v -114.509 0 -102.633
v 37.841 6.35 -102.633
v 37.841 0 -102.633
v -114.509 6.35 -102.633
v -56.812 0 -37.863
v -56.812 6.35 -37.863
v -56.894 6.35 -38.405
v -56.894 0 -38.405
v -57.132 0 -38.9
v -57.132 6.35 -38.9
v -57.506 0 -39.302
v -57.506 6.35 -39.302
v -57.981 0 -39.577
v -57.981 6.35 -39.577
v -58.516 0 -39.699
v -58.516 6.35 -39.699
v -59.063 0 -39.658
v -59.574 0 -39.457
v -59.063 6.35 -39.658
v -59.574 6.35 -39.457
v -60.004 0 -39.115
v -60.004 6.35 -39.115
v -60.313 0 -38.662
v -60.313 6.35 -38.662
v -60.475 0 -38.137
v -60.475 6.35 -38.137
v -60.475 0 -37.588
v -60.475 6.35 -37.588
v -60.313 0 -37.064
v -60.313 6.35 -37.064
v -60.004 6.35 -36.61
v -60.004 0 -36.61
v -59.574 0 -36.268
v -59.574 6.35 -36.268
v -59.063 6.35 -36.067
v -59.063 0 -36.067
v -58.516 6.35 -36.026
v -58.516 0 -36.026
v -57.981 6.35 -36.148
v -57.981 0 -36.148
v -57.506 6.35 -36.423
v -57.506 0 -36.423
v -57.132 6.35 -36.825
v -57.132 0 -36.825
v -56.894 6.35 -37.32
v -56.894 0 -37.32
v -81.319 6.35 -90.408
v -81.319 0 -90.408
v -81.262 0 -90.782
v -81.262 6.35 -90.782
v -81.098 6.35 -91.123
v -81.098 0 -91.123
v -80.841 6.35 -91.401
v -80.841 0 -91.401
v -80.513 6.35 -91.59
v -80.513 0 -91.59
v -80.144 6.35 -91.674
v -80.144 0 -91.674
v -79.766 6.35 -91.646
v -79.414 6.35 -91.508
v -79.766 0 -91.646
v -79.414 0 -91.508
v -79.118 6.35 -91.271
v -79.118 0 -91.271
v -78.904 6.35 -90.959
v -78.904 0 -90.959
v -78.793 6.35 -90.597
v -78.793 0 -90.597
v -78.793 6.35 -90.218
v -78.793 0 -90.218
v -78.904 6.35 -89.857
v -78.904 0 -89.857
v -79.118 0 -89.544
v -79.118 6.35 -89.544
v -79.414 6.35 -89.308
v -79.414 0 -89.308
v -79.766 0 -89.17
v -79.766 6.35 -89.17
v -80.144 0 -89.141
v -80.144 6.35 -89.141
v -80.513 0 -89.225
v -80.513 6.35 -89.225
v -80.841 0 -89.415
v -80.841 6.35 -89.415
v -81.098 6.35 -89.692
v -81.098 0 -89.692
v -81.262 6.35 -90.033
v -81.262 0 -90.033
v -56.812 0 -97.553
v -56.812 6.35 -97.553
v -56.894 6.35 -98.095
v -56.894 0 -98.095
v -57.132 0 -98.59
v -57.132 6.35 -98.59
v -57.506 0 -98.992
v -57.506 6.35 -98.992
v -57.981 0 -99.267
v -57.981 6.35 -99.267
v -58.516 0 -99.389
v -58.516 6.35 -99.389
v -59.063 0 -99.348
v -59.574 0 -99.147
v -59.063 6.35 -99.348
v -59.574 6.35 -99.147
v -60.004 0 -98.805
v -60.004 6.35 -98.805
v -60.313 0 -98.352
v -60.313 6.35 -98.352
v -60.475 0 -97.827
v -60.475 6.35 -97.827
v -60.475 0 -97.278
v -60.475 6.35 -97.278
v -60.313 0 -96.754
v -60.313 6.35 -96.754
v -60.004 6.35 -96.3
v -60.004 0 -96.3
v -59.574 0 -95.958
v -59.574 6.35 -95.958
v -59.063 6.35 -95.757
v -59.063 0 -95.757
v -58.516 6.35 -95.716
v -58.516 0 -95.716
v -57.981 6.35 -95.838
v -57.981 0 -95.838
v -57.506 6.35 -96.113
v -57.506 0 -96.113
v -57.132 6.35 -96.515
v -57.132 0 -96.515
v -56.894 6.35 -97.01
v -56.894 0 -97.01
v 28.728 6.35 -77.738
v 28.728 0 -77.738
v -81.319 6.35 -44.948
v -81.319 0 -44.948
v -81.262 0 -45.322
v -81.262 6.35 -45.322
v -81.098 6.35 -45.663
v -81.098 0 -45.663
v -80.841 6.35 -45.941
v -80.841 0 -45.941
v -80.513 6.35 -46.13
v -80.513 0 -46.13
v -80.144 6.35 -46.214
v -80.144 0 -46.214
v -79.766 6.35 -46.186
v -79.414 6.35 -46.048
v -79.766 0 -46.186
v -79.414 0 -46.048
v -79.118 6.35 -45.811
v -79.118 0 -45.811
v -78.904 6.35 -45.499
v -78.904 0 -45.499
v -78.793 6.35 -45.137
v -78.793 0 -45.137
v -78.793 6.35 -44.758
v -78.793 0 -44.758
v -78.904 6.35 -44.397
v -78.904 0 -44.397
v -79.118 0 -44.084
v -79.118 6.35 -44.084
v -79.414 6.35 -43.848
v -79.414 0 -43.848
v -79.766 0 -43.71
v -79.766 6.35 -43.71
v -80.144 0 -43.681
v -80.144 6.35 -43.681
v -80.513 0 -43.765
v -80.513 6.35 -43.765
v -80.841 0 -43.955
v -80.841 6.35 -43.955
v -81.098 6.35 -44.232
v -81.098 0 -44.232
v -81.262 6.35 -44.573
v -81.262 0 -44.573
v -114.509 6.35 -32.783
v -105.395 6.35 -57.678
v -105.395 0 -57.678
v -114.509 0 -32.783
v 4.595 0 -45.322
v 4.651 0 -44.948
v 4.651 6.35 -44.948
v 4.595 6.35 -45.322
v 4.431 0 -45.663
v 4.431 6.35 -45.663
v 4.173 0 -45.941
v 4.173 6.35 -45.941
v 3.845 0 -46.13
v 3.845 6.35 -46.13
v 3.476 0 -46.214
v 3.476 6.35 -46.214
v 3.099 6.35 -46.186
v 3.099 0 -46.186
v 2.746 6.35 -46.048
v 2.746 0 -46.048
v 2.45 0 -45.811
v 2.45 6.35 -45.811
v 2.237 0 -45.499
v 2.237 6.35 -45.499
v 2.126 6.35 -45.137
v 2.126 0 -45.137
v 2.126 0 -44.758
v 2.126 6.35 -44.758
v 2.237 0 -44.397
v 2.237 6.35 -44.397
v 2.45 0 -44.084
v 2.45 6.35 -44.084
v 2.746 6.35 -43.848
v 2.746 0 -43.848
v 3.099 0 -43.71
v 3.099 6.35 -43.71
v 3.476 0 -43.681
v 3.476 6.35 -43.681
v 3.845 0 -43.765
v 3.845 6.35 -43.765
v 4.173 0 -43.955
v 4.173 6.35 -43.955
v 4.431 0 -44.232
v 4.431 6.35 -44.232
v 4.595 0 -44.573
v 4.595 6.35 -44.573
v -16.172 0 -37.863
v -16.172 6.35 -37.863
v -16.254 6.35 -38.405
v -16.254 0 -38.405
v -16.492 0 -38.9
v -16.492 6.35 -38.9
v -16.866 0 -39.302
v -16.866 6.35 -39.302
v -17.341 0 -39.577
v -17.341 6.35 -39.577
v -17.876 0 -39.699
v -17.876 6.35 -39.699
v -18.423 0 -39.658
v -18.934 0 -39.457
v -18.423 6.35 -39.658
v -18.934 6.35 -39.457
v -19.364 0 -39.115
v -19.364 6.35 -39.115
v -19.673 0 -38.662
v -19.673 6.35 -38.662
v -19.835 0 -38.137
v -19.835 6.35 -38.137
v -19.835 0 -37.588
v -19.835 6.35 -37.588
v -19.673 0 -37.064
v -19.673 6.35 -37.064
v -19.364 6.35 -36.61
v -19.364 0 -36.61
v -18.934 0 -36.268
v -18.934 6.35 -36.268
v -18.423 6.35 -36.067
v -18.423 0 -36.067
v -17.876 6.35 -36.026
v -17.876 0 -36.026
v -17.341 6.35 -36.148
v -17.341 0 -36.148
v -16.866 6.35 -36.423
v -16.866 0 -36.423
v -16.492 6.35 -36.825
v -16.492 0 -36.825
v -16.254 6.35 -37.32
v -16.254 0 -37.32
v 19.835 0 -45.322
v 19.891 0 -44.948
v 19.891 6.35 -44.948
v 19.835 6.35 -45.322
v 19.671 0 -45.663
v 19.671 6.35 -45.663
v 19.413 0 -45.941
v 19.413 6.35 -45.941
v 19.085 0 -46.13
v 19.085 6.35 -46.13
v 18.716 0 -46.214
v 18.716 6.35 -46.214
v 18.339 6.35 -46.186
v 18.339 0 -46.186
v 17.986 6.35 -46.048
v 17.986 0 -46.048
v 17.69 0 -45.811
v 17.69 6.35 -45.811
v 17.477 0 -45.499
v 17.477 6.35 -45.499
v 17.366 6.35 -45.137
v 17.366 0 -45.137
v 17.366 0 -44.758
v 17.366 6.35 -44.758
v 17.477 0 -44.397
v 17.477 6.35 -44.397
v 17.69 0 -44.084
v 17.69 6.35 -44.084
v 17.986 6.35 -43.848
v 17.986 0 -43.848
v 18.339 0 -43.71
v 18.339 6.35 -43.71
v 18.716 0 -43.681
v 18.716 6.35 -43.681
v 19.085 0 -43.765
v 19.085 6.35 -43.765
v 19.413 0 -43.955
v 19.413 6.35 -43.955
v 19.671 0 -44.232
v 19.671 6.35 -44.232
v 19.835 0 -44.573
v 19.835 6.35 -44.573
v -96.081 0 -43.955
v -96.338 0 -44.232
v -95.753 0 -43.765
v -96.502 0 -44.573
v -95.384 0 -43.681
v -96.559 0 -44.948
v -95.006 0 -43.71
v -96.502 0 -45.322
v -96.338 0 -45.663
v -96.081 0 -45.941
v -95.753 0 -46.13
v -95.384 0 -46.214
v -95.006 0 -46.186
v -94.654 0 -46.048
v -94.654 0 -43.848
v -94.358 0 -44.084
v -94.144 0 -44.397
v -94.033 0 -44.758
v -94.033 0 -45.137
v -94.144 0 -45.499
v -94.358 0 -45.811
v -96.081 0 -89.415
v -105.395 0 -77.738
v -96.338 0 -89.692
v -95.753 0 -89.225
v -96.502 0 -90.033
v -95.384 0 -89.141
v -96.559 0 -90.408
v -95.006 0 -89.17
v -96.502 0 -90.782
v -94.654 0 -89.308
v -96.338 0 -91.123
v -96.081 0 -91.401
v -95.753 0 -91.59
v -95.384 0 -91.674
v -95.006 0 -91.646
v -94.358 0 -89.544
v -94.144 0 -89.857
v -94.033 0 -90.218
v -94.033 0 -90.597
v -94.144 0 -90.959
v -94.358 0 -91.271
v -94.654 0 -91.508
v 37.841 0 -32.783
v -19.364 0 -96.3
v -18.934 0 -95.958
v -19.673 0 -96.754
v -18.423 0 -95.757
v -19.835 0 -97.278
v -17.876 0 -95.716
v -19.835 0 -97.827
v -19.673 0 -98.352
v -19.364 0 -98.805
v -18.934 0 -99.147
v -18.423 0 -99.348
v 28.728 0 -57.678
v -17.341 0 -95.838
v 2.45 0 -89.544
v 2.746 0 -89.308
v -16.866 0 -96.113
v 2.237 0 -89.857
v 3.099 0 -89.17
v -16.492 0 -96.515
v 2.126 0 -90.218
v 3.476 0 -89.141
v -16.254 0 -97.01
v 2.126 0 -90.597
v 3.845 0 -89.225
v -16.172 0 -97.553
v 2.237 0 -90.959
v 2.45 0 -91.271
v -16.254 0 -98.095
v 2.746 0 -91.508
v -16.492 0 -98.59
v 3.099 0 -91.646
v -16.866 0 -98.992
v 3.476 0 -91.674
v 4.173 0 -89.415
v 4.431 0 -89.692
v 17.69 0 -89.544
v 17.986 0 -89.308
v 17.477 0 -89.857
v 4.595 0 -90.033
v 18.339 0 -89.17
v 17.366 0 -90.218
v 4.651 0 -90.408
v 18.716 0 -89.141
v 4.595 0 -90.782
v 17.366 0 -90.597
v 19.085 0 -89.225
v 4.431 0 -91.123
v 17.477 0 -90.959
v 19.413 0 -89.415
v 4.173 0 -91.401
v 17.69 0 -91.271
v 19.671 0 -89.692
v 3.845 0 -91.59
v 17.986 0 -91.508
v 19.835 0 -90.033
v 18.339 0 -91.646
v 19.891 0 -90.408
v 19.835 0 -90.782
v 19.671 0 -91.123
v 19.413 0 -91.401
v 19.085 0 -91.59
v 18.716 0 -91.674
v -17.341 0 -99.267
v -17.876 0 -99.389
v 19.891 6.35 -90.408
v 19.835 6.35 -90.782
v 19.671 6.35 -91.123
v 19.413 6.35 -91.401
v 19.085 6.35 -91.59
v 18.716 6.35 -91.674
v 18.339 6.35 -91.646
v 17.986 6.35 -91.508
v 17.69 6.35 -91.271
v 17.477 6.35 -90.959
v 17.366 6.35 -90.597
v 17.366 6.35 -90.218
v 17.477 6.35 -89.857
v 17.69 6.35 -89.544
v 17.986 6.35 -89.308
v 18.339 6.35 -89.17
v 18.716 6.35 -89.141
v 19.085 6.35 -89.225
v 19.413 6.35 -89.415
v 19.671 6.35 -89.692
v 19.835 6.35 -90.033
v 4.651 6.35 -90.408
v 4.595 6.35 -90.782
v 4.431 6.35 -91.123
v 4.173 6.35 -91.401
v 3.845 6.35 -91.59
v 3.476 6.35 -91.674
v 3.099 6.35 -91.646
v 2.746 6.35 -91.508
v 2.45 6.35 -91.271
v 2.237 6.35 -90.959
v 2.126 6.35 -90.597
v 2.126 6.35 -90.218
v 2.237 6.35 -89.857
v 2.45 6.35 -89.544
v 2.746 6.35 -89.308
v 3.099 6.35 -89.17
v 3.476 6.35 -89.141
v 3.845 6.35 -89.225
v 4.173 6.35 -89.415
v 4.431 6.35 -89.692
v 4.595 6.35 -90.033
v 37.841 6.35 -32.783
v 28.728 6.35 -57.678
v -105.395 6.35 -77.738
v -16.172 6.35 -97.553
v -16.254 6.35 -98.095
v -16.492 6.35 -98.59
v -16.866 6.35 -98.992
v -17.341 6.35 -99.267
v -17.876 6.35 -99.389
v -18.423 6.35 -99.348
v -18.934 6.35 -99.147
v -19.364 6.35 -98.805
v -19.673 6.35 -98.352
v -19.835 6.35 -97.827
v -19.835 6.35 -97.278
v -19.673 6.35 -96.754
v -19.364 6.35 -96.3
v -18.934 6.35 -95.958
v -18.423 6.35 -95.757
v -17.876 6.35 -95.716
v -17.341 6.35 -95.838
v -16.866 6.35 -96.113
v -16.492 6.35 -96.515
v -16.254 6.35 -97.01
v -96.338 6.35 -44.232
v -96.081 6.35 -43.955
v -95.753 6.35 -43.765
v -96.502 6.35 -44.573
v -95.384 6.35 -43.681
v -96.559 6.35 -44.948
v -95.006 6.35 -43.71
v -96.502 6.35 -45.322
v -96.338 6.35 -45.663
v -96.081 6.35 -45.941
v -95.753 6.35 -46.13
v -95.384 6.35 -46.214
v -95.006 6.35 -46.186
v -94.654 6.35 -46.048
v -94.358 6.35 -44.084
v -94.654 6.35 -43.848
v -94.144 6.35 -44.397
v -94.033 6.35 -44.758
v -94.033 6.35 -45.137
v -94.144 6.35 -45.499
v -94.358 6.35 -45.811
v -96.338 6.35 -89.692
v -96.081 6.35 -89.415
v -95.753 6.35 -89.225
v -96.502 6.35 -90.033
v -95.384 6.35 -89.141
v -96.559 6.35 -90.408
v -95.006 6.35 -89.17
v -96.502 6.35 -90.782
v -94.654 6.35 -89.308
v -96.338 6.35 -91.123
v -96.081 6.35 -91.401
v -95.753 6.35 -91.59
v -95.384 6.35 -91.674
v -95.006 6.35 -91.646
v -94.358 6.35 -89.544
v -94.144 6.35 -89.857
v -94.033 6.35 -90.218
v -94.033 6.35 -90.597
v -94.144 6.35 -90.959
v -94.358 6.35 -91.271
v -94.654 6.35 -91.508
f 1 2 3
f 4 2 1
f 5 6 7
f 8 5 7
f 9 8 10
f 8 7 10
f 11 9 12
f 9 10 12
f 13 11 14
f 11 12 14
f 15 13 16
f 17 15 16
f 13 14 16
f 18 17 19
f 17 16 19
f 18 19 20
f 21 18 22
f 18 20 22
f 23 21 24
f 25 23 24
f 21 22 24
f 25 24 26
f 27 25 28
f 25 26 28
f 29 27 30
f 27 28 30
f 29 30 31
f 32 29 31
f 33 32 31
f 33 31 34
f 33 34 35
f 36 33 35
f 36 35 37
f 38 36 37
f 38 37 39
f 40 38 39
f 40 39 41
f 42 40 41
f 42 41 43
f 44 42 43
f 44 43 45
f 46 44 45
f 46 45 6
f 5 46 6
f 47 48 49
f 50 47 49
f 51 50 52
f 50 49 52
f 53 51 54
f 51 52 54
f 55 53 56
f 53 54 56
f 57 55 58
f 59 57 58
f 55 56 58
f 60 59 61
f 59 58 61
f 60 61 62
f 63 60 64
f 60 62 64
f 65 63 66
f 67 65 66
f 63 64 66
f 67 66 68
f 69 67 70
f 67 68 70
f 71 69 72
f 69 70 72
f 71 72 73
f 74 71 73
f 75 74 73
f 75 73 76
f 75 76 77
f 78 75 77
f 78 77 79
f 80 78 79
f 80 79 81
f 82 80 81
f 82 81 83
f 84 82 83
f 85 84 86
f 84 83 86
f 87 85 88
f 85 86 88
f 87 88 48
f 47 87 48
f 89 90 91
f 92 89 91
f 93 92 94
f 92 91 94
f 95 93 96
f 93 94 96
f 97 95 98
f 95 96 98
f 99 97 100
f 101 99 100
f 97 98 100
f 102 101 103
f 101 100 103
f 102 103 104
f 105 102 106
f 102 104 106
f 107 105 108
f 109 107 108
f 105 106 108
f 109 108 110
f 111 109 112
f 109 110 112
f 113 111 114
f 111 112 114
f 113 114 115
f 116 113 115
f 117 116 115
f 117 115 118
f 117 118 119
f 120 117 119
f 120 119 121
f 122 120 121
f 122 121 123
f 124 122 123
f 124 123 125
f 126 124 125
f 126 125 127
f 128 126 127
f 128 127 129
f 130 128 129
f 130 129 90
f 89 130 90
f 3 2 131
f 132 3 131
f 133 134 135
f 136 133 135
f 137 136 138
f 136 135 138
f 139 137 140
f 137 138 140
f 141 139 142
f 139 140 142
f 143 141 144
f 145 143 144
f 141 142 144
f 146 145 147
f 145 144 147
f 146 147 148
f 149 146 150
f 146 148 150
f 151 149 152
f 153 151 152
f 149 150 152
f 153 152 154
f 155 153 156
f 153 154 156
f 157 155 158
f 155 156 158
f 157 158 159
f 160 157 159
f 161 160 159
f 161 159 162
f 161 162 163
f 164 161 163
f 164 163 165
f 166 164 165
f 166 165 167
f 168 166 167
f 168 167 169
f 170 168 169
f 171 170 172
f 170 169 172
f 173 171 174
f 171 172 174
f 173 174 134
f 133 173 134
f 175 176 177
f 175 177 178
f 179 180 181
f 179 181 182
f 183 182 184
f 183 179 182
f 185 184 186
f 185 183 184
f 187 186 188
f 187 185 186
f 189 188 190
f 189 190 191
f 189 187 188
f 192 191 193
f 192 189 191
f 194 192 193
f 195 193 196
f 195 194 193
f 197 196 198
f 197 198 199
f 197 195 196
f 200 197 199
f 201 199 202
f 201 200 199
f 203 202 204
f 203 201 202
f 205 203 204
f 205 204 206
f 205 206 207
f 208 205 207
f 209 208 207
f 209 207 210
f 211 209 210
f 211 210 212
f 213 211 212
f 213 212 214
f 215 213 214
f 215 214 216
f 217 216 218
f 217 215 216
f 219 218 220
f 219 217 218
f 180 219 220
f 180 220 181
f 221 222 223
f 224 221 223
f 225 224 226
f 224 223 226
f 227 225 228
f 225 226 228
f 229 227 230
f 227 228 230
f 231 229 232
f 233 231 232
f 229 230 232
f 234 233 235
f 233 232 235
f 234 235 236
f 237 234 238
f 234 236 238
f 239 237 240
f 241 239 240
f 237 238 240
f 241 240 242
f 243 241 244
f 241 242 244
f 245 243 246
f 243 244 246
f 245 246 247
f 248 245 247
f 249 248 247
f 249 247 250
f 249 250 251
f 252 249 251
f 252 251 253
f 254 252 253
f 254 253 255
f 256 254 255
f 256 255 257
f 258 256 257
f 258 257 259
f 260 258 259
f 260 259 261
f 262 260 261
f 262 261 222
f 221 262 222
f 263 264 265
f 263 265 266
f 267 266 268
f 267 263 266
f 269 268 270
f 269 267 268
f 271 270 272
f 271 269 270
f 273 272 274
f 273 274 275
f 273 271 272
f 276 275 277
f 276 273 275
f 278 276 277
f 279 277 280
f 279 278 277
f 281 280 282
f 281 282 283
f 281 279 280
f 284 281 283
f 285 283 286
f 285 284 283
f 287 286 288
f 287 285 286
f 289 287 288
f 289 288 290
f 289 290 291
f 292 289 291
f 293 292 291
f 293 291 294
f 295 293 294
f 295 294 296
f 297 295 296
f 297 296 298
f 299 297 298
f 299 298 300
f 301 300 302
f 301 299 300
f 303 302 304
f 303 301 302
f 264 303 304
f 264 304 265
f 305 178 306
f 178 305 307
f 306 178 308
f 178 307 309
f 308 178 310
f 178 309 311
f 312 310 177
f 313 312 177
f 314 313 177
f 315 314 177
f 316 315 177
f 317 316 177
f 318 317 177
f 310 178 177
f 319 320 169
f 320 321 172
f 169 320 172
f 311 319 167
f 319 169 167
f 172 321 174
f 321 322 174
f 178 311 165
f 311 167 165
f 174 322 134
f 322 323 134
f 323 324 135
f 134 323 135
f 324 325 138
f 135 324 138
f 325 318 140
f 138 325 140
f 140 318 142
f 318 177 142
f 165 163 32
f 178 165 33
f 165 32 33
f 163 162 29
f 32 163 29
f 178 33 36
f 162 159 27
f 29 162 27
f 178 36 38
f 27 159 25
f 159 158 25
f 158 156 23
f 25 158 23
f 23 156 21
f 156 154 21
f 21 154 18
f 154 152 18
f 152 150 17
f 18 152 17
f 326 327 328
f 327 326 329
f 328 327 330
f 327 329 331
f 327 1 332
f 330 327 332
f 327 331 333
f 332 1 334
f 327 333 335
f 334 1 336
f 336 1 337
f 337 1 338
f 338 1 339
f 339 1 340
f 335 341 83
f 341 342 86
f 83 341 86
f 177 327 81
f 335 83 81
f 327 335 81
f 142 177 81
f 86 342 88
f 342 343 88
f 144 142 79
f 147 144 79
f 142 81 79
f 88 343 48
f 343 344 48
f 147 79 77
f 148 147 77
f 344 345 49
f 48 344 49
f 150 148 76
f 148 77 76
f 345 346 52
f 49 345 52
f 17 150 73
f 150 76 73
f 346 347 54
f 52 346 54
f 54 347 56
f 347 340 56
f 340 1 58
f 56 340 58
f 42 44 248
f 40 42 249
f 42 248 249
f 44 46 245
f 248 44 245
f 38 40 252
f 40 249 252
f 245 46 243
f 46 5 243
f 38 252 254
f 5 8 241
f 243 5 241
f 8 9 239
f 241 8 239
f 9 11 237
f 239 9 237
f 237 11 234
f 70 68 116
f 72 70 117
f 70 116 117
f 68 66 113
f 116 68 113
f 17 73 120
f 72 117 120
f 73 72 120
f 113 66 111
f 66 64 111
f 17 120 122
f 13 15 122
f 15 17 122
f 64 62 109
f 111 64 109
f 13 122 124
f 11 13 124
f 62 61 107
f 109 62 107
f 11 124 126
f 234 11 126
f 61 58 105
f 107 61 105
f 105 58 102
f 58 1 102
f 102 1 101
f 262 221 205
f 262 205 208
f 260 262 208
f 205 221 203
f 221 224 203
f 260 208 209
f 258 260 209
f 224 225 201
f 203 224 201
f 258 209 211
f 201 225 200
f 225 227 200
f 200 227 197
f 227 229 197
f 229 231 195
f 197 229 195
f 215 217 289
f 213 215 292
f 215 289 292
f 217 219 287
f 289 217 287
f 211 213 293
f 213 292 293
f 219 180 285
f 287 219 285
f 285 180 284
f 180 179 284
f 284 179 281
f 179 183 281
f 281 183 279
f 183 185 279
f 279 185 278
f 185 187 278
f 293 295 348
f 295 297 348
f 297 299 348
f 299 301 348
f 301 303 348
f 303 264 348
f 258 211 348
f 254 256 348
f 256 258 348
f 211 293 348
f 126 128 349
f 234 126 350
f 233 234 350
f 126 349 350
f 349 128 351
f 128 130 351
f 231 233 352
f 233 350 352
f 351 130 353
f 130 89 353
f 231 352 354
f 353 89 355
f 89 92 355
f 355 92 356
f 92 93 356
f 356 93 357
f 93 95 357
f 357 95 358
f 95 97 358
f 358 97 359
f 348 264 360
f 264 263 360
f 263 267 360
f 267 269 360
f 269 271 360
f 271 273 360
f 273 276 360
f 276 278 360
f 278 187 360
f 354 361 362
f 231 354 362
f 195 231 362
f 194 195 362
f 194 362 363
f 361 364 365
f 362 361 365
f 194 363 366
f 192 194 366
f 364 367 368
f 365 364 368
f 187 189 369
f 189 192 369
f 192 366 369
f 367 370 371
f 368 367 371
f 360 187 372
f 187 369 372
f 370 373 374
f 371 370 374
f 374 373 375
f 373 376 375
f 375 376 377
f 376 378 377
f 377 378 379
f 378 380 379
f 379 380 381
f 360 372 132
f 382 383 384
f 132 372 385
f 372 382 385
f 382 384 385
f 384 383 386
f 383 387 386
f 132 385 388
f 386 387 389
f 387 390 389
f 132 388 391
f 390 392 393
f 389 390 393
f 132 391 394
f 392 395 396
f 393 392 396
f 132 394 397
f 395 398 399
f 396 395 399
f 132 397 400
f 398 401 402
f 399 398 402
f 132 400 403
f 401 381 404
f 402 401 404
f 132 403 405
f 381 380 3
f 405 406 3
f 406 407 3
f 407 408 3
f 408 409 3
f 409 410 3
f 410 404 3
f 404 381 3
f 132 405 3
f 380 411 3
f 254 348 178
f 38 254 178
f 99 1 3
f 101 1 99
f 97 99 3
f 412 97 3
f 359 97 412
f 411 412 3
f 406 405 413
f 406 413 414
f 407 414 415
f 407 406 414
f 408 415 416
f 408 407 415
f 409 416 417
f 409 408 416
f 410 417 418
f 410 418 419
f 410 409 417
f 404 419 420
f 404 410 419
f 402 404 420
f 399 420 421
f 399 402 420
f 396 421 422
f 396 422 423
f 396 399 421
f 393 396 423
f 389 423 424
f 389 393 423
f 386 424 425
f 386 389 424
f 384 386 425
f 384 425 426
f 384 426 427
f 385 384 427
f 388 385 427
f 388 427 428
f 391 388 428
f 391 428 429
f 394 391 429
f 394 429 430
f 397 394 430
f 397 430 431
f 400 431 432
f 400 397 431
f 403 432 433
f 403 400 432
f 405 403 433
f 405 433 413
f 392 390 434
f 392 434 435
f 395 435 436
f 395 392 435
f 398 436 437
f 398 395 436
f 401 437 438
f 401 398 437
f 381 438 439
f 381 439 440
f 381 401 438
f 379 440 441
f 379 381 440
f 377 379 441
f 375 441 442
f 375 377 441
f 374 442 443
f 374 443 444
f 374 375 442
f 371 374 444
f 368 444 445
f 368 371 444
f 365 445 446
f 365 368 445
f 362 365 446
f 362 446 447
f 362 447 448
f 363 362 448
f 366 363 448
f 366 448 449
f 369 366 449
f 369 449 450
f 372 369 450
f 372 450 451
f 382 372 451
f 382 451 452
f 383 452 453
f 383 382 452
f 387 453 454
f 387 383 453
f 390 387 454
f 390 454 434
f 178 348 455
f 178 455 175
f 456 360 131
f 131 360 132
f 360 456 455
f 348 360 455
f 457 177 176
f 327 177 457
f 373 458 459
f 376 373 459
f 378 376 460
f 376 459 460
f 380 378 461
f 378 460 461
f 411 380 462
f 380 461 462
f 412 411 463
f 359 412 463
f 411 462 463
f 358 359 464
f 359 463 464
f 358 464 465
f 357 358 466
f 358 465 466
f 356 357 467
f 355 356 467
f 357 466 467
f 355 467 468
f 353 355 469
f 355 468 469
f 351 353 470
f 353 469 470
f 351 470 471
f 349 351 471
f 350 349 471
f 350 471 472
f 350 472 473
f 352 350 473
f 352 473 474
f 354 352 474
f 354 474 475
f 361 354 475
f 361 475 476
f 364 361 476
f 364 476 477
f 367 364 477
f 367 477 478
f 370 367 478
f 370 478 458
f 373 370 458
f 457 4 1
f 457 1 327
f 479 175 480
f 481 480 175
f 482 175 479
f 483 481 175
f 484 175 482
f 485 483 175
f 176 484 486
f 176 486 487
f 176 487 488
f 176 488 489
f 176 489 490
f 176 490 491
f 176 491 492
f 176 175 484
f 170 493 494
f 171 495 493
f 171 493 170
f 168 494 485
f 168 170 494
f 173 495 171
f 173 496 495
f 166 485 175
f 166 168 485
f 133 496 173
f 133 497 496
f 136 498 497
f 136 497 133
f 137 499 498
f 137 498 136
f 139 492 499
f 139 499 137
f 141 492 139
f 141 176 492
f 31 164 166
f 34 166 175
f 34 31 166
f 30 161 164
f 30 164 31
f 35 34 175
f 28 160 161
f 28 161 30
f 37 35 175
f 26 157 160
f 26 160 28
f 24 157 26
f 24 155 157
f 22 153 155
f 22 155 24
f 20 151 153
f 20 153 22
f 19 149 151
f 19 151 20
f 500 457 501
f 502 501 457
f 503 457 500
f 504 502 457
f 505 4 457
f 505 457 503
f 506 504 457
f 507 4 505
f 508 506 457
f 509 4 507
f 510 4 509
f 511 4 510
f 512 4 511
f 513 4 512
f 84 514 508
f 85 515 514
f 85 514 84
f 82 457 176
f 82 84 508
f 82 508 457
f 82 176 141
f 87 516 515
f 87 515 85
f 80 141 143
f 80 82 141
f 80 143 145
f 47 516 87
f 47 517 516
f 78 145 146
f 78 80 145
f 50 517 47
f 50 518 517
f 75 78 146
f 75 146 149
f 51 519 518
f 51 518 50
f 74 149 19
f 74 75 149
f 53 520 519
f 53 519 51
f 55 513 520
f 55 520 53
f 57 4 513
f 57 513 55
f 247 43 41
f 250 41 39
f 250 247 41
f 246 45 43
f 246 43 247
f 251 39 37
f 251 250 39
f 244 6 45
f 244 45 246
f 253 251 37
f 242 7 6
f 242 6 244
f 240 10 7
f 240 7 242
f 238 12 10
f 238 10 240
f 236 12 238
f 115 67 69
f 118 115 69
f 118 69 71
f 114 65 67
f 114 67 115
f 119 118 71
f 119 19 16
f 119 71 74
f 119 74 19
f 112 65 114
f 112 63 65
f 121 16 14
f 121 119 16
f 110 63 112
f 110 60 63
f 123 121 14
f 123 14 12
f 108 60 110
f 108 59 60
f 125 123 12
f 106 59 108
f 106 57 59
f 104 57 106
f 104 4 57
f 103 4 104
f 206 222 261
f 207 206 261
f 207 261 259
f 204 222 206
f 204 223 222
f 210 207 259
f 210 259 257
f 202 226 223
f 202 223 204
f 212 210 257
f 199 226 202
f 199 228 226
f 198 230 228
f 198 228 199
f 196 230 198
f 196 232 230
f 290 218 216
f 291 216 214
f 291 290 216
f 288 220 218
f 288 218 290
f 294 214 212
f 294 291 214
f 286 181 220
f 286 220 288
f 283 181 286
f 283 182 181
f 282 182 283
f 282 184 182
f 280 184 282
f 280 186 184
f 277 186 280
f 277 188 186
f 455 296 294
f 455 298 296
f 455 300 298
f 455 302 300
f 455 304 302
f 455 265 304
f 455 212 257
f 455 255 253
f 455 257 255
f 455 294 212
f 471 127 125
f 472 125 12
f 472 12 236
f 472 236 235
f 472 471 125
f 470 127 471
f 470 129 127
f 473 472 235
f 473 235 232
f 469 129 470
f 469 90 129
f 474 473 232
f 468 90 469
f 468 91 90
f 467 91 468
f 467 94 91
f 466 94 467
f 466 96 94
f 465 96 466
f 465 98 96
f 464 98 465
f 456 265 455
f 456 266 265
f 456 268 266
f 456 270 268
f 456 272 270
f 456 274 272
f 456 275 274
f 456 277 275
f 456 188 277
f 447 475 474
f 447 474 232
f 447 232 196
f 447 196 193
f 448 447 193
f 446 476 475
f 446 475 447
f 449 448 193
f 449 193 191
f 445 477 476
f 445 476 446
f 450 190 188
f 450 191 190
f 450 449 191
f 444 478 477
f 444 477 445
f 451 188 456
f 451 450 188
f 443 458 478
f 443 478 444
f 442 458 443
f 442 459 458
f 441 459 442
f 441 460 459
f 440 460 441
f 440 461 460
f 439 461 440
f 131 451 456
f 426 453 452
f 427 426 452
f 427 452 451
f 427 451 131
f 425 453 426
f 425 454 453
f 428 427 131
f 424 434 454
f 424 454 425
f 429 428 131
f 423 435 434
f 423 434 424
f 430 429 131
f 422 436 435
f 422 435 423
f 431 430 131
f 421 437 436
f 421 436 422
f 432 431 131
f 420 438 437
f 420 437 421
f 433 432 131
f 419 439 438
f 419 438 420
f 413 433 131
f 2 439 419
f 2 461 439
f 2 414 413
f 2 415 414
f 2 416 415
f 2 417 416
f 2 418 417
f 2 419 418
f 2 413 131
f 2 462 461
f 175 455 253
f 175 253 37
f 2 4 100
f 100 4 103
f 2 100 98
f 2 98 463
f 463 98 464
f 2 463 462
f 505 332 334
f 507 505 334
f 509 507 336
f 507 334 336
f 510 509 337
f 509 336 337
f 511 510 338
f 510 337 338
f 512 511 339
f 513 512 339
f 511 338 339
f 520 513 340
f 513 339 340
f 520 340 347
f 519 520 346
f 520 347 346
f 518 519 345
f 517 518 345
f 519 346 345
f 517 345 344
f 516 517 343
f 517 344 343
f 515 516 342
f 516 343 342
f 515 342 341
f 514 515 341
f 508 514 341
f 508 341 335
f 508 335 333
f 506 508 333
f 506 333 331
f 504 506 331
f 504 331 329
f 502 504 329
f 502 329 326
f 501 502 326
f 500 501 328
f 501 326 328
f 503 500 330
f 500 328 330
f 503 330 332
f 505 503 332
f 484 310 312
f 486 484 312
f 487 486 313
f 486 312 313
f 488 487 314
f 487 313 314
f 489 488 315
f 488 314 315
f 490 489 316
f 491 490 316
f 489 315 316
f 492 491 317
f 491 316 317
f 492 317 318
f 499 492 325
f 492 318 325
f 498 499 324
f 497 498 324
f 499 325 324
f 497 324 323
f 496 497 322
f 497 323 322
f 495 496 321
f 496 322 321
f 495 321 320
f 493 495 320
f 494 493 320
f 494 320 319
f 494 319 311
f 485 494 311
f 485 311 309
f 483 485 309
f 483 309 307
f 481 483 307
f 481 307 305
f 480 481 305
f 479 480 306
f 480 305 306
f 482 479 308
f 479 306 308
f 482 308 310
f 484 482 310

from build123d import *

# Parameters (mm, degrees)
SKETCH1_W           = 67.061286962
SKETCH1_H           = 69.85
SKETCH1_R           = 1.27
BOSS_EXTRUDE1_DEPTH = 6.35
SKETCH2_W           = 20.976278342
SKETCH2_H           = 20.060000012
BOSS_EXTRUDE2_DEPTH = 12.7
BOSS_EXTRUDE3_DEPTH = 6.35
SKETCH4_W           = 170.998259203
SKETCH4_H           = 17.997071231
CUT_EXTRUDE1_DEPTH  = 70.85
SKETCH8_R           = 1.8415
CUT_EXTRUDE3_DEPTH  = 13.716


with BuildPart() as part:
    # Sketch1 → Boss-Extrude1 (new body)
    with BuildSketch(Plane(origin=(0, 0, 0), x_dir=(1, 0, 0), z_dir=(0, 1, 0))):
        with Locations((-4.803022, 67.707661351)):
            Rectangle(SKETCH1_W, SKETCH1_H)
        with Locations((3.381343157, 90.407661351)):
            Circle(SKETCH1_R, mode=Mode.SUBTRACT)
        with Locations((18.621343157, 90.407661351)):
            Circle(SKETCH1_R, mode=Mode.SUBTRACT)
        with Locations((3.381343157, 44.947661351)):
            Circle(SKETCH1_R, mode=Mode.SUBTRACT)
        with Locations((18.621343157, 44.947661351)):
            Circle(SKETCH1_R, mode=Mode.SUBTRACT)
    boss_extrude1 = extrude(amount=BOSS_EXTRUDE1_DEPTH)

    # Sketch2 → Boss-Extrude2 (add)
    with BuildSketch(Plane(origin=(0, 6.35, 0), x_dir=(1, 0, 0), z_dir=(0, 1, 0))):
        with Locations((18.23948231, 67.707661351)):
            Rectangle(SKETCH2_W, SKETCH2_H)
    boss_extrude2 = extrude(amount=BOSS_EXTRUDE2_DEPTH)

    # Sketch3 → Boss-Extrude3 (add)
    with BuildSketch(Plane(origin=(0, 6.35, 0), x_dir=(1, 0, 0), z_dir=(0, 1, 0))):
        Polygon((37.841343157, 102.632661351), (28.727621481, 77.737661357), (28.727621481, 102.632661351), align=None)
        Polygon((28.727621481, 57.677661345), (37.841343157, 32.782661351), (28.727621481, 32.782661351), align=None)
    boss_extrude3 = extrude(amount=-BOSS_EXTRUDE3_DEPTH)

    # Mirror2: Boss-Extrude1, Boss-Extrude2, Boss-Extrude3 across plane
    add(boss_extrude1.mirror(Plane(origin=(-38.333665481, 6.35, -32.782661351), x_dir=(0, 0, 1), z_dir=(1, 0, 0))))
    add(boss_extrude2.mirror(Plane(origin=(-38.333665481, 6.35, -32.782661351), x_dir=(0, 0, 1), z_dir=(1, 0, 0))))
    add(boss_extrude3.mirror(Plane(origin=(-38.333665481, 6.35, -32.782661351), x_dir=(0, 0, 1), z_dir=(1, 0, 0))))

    # Sketch4 → Cut-Extrude1 (cut, through all)
    with BuildSketch(Plane.XY.offset(-32.782661351)):
        with Locations((-47.657786445, 15.348535616)):
            Rectangle(SKETCH4_W, SKETCH4_H)
    extrude(amount=-CUT_EXTRUDE1_DEPTH, mode=Mode.SUBTRACT)

    # Sketch8 → Cut-Extrude3 (cut)
    with BuildSketch(Plane(origin=(0, 6.35, 0), x_dir=(1, 0, 0), z_dir=(0, 1, 0))):
        with Locations((-58.653665481, 97.552661351)):
            Circle(SKETCH8_R)
        with Locations((-18.013665481, 97.552661351)):
            Circle(SKETCH8_R)
        with Locations((-18.013665481, 37.862661351)):
            Circle(SKETCH8_R)
        with Locations((-58.653665481, 37.862661351)):
            Circle(SKETCH8_R)
    extrude(amount=-CUT_EXTRUDE3_DEPTH, mode=Mode.SUBTRACT)


solid = part.part
